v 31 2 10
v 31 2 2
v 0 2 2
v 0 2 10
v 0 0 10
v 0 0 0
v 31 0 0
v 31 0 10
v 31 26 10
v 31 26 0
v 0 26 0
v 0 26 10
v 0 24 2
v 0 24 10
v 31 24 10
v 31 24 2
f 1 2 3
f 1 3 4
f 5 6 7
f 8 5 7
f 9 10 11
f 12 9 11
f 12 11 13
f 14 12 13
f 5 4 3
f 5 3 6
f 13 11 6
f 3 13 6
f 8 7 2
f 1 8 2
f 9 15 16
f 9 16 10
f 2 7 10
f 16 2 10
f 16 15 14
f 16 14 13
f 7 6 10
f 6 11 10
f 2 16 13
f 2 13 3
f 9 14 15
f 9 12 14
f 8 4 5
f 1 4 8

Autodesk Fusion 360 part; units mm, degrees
sketch "Sketch1" plane through (0, 0, 0) normal (0, 0, 1) x (1, 0, 0)
  line L0 (0, 0) -> (31, 0)
  line L1 (31, 0) -> (31, 26)
  line L2 (31, 26) -> (0, 26)
  line L3 (0, 26) -> (0, 0)
  dimension "d1" = 31
  dimension "d2" = 26
extrude "Extrude1" add sketch "Sketch1" along normal blind 10
shell "Shell1" thickness 2 removed faces 1 at (10.3333, 17.3333, 10)
extrude "Extrude2" cut 1 faces at (2, 16.6667, 4.6667) along direction (-1, 0, 0) blind 10
extrude "Extrude3" cut 1 faces at (29, 16.6667, 7.3333) along direction (1, 0, 0) blind 20
